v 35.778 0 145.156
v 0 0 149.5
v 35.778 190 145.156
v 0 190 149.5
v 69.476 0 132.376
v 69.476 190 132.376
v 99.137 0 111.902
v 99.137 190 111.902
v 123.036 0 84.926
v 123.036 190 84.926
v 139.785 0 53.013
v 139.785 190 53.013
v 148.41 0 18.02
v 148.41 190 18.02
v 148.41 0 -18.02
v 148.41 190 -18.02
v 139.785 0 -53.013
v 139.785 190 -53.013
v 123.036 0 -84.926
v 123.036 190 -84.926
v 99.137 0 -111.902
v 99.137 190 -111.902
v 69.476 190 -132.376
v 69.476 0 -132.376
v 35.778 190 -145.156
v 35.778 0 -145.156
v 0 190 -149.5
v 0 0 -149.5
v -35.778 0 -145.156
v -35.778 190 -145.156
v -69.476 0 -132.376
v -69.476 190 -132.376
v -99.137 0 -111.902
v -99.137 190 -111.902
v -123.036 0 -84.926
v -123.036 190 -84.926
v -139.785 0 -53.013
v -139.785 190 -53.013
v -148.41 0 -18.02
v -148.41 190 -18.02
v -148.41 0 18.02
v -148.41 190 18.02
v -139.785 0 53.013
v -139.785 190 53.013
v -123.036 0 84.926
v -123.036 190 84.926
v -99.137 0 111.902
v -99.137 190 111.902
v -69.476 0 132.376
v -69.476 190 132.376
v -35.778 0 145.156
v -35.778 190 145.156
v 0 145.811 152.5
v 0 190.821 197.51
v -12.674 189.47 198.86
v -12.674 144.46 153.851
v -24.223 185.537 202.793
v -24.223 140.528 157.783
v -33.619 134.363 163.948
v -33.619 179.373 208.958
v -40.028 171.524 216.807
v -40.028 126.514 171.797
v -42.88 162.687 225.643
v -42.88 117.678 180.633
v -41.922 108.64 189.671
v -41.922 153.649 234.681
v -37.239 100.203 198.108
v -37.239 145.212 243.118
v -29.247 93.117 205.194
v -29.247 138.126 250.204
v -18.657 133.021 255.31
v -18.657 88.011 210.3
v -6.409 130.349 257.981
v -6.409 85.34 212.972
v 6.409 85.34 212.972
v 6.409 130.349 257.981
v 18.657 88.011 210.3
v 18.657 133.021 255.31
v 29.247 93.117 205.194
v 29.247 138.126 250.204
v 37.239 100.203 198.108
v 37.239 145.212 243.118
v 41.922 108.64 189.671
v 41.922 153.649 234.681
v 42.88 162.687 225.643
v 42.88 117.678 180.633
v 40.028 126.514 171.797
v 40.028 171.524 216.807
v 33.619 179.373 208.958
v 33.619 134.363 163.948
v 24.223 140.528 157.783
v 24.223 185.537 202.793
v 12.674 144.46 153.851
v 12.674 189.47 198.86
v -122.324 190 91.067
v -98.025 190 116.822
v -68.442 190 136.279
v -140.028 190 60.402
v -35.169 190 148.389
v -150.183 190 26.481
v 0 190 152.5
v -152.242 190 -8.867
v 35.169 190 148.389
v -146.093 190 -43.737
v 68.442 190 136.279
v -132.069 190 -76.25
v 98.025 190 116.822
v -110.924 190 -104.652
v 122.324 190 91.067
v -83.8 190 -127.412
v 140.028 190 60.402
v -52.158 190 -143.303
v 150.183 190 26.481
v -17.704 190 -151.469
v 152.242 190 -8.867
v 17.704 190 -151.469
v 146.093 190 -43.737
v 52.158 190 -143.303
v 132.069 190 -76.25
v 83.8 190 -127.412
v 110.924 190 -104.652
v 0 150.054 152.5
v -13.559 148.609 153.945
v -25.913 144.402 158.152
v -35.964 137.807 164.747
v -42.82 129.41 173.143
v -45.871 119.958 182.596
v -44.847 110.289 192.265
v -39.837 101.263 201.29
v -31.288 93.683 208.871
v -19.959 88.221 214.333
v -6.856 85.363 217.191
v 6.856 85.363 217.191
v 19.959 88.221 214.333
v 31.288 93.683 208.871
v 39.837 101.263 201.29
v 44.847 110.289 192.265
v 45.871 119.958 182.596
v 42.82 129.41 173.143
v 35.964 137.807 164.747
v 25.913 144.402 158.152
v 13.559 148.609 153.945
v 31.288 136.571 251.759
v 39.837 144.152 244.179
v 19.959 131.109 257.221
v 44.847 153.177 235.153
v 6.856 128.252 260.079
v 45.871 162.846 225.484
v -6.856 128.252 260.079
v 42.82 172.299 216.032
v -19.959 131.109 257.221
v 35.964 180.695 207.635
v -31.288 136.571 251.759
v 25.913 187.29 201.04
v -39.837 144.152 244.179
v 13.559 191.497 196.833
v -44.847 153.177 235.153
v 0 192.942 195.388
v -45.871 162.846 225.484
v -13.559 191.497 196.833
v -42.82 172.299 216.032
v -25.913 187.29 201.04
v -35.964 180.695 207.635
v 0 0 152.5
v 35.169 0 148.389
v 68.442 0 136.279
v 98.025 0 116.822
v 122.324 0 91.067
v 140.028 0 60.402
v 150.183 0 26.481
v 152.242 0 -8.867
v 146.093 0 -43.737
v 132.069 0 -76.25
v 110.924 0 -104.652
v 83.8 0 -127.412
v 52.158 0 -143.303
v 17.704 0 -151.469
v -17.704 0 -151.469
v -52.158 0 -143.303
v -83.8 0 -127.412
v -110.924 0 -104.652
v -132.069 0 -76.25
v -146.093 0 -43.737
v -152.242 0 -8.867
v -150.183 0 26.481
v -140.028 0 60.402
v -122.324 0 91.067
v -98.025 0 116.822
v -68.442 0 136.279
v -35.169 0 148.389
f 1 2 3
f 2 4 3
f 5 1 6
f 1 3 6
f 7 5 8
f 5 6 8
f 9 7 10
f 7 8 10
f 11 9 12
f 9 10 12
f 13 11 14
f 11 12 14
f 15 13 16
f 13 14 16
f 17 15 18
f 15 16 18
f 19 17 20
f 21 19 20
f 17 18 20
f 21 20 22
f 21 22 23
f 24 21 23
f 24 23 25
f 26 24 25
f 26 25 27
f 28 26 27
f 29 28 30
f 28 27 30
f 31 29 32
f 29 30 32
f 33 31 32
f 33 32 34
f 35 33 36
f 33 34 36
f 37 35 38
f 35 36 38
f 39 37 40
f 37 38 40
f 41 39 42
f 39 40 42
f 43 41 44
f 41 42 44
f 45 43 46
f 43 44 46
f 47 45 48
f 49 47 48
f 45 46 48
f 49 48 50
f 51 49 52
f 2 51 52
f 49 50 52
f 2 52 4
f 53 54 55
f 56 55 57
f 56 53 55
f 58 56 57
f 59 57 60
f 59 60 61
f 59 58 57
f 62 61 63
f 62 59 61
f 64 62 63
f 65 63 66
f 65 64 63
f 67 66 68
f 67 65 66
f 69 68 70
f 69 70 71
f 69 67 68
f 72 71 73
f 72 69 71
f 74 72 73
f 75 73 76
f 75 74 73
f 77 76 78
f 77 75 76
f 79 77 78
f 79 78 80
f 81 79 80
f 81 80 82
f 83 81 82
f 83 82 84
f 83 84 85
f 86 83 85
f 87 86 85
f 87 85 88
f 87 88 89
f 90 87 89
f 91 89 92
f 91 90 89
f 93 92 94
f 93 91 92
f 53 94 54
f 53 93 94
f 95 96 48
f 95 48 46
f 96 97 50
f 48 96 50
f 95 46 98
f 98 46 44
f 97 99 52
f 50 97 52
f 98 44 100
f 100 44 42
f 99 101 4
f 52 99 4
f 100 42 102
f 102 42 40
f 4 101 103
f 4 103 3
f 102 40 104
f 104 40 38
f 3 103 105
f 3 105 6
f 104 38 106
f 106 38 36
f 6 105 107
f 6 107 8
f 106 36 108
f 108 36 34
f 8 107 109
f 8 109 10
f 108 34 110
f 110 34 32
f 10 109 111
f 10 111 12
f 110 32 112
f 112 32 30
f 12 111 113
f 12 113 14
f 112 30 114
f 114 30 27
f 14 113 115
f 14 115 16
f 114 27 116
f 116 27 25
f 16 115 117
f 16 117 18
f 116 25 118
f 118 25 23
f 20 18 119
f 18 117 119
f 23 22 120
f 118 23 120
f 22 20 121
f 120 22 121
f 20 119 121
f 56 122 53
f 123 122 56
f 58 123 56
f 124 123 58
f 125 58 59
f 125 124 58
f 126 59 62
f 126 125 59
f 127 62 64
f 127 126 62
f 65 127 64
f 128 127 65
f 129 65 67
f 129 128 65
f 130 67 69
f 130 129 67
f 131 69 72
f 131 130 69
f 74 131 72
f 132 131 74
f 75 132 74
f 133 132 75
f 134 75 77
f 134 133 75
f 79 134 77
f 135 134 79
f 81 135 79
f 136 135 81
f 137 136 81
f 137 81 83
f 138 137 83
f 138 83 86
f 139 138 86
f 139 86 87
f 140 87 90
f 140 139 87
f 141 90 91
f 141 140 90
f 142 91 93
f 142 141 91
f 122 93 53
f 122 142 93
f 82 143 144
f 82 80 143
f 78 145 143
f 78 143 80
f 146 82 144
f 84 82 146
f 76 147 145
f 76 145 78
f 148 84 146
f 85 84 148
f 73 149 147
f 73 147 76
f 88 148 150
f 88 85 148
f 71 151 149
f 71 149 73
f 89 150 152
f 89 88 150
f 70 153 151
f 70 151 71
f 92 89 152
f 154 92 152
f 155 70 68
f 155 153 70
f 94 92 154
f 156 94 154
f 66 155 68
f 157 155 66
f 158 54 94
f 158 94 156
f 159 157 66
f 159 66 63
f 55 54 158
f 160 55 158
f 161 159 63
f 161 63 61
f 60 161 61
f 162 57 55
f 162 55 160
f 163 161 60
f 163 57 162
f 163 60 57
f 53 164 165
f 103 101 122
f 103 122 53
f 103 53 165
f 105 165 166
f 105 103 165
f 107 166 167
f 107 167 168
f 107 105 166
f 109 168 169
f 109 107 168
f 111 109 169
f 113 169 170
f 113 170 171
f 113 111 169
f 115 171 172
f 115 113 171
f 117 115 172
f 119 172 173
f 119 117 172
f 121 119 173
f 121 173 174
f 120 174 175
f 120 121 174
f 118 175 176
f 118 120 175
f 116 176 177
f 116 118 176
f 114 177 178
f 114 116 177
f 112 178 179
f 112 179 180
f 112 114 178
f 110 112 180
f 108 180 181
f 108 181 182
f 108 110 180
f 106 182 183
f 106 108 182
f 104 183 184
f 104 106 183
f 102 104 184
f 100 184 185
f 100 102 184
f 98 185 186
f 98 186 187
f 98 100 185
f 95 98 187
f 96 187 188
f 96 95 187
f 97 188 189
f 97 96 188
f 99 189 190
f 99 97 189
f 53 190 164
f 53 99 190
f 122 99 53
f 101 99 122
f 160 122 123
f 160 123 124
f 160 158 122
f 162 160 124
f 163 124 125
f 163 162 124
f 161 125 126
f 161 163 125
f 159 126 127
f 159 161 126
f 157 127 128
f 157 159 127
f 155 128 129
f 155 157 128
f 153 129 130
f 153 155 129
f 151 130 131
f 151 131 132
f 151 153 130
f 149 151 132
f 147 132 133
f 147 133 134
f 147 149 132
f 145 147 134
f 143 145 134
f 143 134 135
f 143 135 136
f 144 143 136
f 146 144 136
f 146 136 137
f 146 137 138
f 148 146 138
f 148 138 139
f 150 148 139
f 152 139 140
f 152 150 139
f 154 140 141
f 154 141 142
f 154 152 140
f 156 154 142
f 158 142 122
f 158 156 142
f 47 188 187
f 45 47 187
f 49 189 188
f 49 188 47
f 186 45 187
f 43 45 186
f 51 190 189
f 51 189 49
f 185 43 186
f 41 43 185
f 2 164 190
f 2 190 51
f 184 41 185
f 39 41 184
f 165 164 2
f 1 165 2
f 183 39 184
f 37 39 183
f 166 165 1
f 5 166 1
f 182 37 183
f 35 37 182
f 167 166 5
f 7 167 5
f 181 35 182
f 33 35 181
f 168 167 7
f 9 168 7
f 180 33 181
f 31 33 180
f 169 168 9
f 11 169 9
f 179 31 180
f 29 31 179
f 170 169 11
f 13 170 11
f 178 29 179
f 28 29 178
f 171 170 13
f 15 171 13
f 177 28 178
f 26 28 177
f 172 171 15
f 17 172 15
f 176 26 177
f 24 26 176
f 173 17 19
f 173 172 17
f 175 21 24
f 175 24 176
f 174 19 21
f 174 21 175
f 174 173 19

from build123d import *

# Parameters (mm, degrees)
F0_W = 190
F0_H = 3


with BuildPart() as f1:
    # F0 (on Right) → F1 (revolve)
    with BuildSketch(Plane.YZ):
        with Locations((95, 151)):
            Rectangle(F0_W, F0_H)
    revolve(axis=Axis((0, 313.279984, 0), (0, 1, 0)))

    # F2 (on Right) → F3 (revolve)
    with BuildSketch(Plane.YZ):
        Polygon((190.820752, 197.509568), (145.811183, 152.5), (150.053824, 152.5), (192.942072, 195.388248), align=None)
    revolve(axis=Axis((0, 111.468418, 178.968418), (0, 0.707107, 0.707107)))


solid = f1.part
